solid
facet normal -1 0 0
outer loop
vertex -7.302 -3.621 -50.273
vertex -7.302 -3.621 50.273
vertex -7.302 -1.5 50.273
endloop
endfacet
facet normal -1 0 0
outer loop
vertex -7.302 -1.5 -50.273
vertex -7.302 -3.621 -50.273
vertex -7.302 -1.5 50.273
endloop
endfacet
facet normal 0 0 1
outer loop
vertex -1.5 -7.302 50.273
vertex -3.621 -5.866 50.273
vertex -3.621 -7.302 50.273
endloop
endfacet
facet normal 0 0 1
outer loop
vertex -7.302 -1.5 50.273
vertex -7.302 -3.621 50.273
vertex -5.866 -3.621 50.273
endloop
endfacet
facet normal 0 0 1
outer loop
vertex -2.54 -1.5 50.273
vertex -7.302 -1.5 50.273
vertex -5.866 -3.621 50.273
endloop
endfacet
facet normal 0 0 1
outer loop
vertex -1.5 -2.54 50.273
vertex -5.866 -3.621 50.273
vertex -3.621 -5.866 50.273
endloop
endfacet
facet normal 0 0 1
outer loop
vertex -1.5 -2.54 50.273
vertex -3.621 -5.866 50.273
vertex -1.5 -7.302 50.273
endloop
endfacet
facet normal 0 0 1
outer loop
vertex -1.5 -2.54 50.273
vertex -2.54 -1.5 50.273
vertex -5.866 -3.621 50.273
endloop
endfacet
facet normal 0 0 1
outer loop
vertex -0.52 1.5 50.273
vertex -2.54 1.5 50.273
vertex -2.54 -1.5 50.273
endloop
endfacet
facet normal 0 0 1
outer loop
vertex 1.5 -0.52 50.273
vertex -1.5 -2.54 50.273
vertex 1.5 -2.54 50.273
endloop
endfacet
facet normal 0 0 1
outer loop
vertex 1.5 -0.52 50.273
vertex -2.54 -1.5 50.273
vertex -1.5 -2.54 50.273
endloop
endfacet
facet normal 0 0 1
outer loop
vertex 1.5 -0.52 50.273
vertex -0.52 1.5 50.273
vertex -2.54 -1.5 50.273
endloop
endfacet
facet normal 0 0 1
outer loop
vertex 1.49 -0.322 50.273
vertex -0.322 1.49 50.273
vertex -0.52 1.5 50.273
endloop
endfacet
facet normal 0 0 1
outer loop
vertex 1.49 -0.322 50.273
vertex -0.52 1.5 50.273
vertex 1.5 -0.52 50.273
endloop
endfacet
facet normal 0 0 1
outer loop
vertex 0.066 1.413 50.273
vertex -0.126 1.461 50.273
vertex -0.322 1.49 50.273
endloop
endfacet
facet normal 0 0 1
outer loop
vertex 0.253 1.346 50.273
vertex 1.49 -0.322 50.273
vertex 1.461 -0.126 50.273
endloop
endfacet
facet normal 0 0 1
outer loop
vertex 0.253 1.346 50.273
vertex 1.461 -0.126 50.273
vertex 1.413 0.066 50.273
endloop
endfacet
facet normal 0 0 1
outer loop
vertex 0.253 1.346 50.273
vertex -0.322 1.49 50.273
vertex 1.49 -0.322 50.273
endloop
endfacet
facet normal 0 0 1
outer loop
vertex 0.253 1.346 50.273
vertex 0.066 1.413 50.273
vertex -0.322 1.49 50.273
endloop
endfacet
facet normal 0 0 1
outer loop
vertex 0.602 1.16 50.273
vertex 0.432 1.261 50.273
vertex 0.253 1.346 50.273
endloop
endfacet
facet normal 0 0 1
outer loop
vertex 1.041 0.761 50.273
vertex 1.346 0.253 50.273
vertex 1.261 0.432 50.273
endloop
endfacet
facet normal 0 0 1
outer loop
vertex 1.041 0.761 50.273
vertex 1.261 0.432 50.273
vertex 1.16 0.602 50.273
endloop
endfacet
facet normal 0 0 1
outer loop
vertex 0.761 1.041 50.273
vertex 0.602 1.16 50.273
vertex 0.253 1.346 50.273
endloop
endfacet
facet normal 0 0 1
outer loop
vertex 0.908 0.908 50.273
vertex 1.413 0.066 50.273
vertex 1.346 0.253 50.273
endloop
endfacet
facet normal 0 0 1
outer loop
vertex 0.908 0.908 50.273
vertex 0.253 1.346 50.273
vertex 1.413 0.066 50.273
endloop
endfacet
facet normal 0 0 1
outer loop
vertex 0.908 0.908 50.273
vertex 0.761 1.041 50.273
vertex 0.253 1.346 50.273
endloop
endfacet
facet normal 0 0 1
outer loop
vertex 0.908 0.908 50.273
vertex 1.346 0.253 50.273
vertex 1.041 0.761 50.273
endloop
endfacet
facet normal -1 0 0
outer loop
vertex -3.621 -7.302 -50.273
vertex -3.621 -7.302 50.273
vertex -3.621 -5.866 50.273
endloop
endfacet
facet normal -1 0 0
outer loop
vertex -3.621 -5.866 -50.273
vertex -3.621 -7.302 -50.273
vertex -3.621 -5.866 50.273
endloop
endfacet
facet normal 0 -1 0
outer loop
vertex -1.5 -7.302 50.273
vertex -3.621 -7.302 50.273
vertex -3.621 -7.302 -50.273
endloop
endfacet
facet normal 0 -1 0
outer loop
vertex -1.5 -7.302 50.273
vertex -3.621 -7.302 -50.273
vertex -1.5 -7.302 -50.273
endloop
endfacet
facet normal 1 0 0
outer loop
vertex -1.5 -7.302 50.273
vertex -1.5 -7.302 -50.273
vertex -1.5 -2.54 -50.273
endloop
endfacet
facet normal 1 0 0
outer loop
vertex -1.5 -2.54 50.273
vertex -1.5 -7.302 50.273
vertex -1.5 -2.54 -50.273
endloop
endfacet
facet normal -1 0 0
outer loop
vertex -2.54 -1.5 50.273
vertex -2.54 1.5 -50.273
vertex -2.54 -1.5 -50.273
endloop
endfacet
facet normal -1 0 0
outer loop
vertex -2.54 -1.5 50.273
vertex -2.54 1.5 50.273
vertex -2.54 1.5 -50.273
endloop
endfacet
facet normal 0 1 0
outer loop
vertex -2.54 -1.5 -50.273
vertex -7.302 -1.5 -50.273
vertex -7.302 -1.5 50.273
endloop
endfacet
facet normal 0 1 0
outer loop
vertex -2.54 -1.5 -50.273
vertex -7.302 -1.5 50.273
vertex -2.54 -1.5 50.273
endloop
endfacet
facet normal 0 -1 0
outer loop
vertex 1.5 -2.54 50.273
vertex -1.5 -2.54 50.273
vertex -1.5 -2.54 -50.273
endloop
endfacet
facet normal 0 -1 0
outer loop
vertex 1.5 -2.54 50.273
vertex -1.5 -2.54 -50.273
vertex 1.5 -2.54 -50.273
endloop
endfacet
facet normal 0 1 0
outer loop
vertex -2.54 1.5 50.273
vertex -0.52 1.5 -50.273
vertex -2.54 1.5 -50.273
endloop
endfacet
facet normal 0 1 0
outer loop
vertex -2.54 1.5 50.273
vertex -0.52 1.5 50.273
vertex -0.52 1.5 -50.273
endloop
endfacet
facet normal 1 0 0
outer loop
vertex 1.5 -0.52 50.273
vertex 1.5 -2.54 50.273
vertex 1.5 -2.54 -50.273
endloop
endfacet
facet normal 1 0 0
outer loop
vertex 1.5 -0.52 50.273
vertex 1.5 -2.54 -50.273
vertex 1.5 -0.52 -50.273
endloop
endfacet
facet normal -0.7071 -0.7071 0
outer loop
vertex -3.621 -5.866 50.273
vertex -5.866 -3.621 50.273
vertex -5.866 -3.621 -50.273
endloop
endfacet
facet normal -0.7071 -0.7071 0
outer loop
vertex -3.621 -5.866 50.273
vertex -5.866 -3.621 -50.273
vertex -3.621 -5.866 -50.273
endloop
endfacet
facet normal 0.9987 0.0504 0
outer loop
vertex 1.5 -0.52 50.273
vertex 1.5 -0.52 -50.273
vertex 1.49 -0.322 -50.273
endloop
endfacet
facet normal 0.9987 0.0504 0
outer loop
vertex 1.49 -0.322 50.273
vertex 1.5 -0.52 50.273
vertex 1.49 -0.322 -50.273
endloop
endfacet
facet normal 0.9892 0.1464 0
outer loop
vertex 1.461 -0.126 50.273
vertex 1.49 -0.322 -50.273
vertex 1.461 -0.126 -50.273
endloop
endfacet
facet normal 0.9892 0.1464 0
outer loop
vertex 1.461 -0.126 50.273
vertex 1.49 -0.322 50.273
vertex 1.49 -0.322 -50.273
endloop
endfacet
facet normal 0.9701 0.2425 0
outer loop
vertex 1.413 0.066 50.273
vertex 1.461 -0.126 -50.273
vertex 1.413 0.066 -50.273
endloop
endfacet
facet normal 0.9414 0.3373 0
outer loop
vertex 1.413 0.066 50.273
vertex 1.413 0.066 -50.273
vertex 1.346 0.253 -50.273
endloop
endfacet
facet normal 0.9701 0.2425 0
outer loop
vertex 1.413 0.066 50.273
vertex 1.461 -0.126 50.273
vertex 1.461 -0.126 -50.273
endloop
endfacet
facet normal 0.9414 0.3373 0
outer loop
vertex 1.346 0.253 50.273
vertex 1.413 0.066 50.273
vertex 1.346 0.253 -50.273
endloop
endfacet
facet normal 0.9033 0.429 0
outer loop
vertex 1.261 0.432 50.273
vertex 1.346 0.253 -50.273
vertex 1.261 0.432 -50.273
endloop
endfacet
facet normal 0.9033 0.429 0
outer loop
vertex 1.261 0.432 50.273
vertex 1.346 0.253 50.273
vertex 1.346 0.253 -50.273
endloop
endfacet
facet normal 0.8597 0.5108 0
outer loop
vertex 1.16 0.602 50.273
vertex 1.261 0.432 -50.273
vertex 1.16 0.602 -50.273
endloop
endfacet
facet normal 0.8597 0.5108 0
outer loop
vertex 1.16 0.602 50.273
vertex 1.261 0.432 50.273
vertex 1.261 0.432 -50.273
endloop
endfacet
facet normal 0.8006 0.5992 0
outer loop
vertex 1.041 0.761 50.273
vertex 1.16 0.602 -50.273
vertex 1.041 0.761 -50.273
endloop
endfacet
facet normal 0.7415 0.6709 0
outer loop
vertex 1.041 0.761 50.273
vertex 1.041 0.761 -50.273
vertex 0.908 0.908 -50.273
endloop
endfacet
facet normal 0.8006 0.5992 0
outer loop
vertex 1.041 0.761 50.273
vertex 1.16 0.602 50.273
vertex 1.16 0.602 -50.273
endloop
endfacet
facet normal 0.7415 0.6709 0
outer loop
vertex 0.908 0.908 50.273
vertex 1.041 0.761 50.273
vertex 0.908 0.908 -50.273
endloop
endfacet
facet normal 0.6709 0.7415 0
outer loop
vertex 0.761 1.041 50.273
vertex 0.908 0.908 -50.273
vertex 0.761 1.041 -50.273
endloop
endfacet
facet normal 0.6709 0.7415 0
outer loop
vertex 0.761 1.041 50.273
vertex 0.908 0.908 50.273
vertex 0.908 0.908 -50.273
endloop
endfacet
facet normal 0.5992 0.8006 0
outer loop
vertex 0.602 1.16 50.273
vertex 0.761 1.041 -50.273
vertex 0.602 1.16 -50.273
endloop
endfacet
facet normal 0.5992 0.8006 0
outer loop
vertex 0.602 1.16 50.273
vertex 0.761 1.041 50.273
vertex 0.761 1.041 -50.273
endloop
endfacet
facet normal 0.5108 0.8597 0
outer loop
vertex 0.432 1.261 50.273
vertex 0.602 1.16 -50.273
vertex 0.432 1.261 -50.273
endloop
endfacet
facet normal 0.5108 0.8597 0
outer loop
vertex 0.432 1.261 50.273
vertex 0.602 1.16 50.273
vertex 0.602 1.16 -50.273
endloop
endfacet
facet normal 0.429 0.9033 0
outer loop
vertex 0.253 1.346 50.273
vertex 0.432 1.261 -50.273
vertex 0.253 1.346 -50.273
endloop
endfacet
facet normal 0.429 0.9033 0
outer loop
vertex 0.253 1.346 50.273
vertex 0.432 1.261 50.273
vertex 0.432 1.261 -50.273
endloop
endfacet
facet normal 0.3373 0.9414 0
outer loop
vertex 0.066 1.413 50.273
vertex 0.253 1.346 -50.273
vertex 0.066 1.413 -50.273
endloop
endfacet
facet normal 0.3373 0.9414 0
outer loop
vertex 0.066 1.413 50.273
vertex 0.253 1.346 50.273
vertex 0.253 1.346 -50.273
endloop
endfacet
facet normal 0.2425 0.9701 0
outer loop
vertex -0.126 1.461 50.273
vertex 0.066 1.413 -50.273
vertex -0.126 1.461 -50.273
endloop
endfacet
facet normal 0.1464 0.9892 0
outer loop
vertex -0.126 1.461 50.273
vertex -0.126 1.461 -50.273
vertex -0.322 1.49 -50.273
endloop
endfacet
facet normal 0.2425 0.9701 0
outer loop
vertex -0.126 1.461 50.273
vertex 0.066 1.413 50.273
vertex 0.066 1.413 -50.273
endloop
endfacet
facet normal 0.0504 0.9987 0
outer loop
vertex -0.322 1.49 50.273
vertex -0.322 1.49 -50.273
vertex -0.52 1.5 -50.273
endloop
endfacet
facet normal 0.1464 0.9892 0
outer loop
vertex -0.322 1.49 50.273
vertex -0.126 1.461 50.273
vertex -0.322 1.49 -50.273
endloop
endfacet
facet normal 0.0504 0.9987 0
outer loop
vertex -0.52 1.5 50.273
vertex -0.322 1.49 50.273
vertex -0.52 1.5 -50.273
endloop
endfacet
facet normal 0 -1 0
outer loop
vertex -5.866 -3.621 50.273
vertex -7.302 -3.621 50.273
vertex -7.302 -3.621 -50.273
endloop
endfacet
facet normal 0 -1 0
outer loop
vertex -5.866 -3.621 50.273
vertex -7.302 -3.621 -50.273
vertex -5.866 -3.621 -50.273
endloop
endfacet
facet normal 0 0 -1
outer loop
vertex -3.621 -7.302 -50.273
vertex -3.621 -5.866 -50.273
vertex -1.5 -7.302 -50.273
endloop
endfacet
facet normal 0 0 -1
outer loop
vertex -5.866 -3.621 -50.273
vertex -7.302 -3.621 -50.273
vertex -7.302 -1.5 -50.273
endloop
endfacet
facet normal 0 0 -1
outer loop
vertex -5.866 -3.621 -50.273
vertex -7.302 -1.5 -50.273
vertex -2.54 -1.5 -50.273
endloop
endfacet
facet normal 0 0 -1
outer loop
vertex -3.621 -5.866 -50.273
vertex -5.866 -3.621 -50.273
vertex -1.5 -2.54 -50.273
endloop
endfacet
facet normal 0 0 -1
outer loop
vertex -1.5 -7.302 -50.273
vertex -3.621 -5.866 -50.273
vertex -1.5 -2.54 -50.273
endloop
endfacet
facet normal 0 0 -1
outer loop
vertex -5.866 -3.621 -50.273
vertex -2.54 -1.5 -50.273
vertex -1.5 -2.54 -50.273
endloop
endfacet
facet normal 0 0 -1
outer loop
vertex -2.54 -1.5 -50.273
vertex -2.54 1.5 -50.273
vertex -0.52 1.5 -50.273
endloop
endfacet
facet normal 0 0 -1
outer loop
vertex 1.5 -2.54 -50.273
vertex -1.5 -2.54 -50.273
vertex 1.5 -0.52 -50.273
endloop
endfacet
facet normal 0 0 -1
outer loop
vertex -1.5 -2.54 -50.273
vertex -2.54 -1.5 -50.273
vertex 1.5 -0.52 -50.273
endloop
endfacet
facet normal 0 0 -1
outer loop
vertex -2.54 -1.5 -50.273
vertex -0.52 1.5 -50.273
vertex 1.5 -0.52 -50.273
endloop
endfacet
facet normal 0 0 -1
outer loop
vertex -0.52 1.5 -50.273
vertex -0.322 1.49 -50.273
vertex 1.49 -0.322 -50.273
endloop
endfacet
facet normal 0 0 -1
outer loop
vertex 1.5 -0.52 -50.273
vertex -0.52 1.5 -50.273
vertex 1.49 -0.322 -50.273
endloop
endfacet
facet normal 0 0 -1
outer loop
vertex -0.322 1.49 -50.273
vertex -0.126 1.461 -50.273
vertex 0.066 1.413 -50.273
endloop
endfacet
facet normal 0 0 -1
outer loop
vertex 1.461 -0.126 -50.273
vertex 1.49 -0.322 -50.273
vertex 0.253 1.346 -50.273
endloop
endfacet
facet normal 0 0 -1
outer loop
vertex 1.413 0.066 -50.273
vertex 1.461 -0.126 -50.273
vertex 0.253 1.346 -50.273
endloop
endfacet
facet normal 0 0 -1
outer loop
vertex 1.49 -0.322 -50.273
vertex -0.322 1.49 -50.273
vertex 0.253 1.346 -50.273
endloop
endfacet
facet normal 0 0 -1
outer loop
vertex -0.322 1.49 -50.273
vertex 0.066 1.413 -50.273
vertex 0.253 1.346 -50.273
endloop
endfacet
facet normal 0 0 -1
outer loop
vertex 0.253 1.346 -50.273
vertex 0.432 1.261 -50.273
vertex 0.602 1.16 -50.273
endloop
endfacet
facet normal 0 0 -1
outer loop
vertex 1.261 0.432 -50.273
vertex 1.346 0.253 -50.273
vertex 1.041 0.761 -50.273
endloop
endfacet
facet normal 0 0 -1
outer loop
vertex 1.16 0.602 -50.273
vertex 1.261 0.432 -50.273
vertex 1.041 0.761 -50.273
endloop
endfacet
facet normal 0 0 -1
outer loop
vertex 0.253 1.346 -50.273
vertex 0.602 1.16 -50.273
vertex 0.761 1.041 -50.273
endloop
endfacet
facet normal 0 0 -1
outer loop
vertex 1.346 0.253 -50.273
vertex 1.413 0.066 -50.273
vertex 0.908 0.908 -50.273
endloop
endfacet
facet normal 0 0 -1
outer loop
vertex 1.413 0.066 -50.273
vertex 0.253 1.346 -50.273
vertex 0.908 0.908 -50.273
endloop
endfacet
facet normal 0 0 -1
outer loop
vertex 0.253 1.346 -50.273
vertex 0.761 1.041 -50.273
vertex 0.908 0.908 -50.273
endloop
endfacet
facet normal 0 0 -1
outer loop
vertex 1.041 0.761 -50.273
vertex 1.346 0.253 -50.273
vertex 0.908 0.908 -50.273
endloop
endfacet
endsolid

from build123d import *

# Parameters (mm, degrees)
SKETCH7_W           = 4.7625
SKETCH7_H           = 2.12122512
BOSS_EXTRUDE2_DEPTH = 50.27295
SKETCH8_W           = 2.12122512
SKETCH8_H           = 4.7625
BOSS_EXTRUDE3_DEPTH = 50.27295
BOSS_EXTRUDE4_DEPTH = 50.27295


with BuildPart() as part:
    # Sketch7 → Boss-Extrude2 (new, symmetric)
    with BuildSketch(Plane.XY):
        with Locations((-4.92125, -2.560612608)):
            Rectangle(SKETCH7_W, SKETCH7_H)
    extrude(amount=BOSS_EXTRUDE2_DEPTH, both=True)

    # Sketch8 → Boss-Extrude3 (add, symmetric)
    with BuildSketch(Plane.XY):
        with Locations((-2.560612608, -4.92125)):
            Rectangle(SKETCH8_W, SKETCH8_H)
    extrude(amount=BOSS_EXTRUDE3_DEPTH, both=True)

    # Sketch11 → Boss-Extrude4 (add, symmetric)
    with BuildSketch(Plane.XY):
        with BuildLine():
            Line((-2.54, 1.500000048), (-2.54, -1.500000048))
            Line((-2.54, -1.500000048), (-7.3025, -1.500000048))
            Line((-7.3025, -1.500000048), (-7.3025, -3.621225168))
            Line((-7.3025, -3.621225168), (-5.866289198, -3.621225168))
            Line((-5.866289198, -3.621225168), (-3.621225168, -5.866289198))
            Line((-3.621225168, -5.866289198), (-3.621225168, -7.3025))
            Line((-3.621225168, -7.3025), (-1.500000048, -7.3025))
            Line((-1.500000048, -7.3025), (-1.500000048, -2.54))
            Line((-1.500000048, -2.54), (1.500000048, -2.54))
            Line((1.500000048, -2.54), (1.500000048, -0.519999976))
            ThreePointArc((1.500000048, -0.519999976), (0.908355739, 0.908355739), (-0.519999976, 1.500000048))
            Line((-0.519999976, 1.500000048), (-2.54, 1.500000048))
        make_face()
    extrude(amount=BOSS_EXTRUDE4_DEPTH, both=True)


solid = part.part
